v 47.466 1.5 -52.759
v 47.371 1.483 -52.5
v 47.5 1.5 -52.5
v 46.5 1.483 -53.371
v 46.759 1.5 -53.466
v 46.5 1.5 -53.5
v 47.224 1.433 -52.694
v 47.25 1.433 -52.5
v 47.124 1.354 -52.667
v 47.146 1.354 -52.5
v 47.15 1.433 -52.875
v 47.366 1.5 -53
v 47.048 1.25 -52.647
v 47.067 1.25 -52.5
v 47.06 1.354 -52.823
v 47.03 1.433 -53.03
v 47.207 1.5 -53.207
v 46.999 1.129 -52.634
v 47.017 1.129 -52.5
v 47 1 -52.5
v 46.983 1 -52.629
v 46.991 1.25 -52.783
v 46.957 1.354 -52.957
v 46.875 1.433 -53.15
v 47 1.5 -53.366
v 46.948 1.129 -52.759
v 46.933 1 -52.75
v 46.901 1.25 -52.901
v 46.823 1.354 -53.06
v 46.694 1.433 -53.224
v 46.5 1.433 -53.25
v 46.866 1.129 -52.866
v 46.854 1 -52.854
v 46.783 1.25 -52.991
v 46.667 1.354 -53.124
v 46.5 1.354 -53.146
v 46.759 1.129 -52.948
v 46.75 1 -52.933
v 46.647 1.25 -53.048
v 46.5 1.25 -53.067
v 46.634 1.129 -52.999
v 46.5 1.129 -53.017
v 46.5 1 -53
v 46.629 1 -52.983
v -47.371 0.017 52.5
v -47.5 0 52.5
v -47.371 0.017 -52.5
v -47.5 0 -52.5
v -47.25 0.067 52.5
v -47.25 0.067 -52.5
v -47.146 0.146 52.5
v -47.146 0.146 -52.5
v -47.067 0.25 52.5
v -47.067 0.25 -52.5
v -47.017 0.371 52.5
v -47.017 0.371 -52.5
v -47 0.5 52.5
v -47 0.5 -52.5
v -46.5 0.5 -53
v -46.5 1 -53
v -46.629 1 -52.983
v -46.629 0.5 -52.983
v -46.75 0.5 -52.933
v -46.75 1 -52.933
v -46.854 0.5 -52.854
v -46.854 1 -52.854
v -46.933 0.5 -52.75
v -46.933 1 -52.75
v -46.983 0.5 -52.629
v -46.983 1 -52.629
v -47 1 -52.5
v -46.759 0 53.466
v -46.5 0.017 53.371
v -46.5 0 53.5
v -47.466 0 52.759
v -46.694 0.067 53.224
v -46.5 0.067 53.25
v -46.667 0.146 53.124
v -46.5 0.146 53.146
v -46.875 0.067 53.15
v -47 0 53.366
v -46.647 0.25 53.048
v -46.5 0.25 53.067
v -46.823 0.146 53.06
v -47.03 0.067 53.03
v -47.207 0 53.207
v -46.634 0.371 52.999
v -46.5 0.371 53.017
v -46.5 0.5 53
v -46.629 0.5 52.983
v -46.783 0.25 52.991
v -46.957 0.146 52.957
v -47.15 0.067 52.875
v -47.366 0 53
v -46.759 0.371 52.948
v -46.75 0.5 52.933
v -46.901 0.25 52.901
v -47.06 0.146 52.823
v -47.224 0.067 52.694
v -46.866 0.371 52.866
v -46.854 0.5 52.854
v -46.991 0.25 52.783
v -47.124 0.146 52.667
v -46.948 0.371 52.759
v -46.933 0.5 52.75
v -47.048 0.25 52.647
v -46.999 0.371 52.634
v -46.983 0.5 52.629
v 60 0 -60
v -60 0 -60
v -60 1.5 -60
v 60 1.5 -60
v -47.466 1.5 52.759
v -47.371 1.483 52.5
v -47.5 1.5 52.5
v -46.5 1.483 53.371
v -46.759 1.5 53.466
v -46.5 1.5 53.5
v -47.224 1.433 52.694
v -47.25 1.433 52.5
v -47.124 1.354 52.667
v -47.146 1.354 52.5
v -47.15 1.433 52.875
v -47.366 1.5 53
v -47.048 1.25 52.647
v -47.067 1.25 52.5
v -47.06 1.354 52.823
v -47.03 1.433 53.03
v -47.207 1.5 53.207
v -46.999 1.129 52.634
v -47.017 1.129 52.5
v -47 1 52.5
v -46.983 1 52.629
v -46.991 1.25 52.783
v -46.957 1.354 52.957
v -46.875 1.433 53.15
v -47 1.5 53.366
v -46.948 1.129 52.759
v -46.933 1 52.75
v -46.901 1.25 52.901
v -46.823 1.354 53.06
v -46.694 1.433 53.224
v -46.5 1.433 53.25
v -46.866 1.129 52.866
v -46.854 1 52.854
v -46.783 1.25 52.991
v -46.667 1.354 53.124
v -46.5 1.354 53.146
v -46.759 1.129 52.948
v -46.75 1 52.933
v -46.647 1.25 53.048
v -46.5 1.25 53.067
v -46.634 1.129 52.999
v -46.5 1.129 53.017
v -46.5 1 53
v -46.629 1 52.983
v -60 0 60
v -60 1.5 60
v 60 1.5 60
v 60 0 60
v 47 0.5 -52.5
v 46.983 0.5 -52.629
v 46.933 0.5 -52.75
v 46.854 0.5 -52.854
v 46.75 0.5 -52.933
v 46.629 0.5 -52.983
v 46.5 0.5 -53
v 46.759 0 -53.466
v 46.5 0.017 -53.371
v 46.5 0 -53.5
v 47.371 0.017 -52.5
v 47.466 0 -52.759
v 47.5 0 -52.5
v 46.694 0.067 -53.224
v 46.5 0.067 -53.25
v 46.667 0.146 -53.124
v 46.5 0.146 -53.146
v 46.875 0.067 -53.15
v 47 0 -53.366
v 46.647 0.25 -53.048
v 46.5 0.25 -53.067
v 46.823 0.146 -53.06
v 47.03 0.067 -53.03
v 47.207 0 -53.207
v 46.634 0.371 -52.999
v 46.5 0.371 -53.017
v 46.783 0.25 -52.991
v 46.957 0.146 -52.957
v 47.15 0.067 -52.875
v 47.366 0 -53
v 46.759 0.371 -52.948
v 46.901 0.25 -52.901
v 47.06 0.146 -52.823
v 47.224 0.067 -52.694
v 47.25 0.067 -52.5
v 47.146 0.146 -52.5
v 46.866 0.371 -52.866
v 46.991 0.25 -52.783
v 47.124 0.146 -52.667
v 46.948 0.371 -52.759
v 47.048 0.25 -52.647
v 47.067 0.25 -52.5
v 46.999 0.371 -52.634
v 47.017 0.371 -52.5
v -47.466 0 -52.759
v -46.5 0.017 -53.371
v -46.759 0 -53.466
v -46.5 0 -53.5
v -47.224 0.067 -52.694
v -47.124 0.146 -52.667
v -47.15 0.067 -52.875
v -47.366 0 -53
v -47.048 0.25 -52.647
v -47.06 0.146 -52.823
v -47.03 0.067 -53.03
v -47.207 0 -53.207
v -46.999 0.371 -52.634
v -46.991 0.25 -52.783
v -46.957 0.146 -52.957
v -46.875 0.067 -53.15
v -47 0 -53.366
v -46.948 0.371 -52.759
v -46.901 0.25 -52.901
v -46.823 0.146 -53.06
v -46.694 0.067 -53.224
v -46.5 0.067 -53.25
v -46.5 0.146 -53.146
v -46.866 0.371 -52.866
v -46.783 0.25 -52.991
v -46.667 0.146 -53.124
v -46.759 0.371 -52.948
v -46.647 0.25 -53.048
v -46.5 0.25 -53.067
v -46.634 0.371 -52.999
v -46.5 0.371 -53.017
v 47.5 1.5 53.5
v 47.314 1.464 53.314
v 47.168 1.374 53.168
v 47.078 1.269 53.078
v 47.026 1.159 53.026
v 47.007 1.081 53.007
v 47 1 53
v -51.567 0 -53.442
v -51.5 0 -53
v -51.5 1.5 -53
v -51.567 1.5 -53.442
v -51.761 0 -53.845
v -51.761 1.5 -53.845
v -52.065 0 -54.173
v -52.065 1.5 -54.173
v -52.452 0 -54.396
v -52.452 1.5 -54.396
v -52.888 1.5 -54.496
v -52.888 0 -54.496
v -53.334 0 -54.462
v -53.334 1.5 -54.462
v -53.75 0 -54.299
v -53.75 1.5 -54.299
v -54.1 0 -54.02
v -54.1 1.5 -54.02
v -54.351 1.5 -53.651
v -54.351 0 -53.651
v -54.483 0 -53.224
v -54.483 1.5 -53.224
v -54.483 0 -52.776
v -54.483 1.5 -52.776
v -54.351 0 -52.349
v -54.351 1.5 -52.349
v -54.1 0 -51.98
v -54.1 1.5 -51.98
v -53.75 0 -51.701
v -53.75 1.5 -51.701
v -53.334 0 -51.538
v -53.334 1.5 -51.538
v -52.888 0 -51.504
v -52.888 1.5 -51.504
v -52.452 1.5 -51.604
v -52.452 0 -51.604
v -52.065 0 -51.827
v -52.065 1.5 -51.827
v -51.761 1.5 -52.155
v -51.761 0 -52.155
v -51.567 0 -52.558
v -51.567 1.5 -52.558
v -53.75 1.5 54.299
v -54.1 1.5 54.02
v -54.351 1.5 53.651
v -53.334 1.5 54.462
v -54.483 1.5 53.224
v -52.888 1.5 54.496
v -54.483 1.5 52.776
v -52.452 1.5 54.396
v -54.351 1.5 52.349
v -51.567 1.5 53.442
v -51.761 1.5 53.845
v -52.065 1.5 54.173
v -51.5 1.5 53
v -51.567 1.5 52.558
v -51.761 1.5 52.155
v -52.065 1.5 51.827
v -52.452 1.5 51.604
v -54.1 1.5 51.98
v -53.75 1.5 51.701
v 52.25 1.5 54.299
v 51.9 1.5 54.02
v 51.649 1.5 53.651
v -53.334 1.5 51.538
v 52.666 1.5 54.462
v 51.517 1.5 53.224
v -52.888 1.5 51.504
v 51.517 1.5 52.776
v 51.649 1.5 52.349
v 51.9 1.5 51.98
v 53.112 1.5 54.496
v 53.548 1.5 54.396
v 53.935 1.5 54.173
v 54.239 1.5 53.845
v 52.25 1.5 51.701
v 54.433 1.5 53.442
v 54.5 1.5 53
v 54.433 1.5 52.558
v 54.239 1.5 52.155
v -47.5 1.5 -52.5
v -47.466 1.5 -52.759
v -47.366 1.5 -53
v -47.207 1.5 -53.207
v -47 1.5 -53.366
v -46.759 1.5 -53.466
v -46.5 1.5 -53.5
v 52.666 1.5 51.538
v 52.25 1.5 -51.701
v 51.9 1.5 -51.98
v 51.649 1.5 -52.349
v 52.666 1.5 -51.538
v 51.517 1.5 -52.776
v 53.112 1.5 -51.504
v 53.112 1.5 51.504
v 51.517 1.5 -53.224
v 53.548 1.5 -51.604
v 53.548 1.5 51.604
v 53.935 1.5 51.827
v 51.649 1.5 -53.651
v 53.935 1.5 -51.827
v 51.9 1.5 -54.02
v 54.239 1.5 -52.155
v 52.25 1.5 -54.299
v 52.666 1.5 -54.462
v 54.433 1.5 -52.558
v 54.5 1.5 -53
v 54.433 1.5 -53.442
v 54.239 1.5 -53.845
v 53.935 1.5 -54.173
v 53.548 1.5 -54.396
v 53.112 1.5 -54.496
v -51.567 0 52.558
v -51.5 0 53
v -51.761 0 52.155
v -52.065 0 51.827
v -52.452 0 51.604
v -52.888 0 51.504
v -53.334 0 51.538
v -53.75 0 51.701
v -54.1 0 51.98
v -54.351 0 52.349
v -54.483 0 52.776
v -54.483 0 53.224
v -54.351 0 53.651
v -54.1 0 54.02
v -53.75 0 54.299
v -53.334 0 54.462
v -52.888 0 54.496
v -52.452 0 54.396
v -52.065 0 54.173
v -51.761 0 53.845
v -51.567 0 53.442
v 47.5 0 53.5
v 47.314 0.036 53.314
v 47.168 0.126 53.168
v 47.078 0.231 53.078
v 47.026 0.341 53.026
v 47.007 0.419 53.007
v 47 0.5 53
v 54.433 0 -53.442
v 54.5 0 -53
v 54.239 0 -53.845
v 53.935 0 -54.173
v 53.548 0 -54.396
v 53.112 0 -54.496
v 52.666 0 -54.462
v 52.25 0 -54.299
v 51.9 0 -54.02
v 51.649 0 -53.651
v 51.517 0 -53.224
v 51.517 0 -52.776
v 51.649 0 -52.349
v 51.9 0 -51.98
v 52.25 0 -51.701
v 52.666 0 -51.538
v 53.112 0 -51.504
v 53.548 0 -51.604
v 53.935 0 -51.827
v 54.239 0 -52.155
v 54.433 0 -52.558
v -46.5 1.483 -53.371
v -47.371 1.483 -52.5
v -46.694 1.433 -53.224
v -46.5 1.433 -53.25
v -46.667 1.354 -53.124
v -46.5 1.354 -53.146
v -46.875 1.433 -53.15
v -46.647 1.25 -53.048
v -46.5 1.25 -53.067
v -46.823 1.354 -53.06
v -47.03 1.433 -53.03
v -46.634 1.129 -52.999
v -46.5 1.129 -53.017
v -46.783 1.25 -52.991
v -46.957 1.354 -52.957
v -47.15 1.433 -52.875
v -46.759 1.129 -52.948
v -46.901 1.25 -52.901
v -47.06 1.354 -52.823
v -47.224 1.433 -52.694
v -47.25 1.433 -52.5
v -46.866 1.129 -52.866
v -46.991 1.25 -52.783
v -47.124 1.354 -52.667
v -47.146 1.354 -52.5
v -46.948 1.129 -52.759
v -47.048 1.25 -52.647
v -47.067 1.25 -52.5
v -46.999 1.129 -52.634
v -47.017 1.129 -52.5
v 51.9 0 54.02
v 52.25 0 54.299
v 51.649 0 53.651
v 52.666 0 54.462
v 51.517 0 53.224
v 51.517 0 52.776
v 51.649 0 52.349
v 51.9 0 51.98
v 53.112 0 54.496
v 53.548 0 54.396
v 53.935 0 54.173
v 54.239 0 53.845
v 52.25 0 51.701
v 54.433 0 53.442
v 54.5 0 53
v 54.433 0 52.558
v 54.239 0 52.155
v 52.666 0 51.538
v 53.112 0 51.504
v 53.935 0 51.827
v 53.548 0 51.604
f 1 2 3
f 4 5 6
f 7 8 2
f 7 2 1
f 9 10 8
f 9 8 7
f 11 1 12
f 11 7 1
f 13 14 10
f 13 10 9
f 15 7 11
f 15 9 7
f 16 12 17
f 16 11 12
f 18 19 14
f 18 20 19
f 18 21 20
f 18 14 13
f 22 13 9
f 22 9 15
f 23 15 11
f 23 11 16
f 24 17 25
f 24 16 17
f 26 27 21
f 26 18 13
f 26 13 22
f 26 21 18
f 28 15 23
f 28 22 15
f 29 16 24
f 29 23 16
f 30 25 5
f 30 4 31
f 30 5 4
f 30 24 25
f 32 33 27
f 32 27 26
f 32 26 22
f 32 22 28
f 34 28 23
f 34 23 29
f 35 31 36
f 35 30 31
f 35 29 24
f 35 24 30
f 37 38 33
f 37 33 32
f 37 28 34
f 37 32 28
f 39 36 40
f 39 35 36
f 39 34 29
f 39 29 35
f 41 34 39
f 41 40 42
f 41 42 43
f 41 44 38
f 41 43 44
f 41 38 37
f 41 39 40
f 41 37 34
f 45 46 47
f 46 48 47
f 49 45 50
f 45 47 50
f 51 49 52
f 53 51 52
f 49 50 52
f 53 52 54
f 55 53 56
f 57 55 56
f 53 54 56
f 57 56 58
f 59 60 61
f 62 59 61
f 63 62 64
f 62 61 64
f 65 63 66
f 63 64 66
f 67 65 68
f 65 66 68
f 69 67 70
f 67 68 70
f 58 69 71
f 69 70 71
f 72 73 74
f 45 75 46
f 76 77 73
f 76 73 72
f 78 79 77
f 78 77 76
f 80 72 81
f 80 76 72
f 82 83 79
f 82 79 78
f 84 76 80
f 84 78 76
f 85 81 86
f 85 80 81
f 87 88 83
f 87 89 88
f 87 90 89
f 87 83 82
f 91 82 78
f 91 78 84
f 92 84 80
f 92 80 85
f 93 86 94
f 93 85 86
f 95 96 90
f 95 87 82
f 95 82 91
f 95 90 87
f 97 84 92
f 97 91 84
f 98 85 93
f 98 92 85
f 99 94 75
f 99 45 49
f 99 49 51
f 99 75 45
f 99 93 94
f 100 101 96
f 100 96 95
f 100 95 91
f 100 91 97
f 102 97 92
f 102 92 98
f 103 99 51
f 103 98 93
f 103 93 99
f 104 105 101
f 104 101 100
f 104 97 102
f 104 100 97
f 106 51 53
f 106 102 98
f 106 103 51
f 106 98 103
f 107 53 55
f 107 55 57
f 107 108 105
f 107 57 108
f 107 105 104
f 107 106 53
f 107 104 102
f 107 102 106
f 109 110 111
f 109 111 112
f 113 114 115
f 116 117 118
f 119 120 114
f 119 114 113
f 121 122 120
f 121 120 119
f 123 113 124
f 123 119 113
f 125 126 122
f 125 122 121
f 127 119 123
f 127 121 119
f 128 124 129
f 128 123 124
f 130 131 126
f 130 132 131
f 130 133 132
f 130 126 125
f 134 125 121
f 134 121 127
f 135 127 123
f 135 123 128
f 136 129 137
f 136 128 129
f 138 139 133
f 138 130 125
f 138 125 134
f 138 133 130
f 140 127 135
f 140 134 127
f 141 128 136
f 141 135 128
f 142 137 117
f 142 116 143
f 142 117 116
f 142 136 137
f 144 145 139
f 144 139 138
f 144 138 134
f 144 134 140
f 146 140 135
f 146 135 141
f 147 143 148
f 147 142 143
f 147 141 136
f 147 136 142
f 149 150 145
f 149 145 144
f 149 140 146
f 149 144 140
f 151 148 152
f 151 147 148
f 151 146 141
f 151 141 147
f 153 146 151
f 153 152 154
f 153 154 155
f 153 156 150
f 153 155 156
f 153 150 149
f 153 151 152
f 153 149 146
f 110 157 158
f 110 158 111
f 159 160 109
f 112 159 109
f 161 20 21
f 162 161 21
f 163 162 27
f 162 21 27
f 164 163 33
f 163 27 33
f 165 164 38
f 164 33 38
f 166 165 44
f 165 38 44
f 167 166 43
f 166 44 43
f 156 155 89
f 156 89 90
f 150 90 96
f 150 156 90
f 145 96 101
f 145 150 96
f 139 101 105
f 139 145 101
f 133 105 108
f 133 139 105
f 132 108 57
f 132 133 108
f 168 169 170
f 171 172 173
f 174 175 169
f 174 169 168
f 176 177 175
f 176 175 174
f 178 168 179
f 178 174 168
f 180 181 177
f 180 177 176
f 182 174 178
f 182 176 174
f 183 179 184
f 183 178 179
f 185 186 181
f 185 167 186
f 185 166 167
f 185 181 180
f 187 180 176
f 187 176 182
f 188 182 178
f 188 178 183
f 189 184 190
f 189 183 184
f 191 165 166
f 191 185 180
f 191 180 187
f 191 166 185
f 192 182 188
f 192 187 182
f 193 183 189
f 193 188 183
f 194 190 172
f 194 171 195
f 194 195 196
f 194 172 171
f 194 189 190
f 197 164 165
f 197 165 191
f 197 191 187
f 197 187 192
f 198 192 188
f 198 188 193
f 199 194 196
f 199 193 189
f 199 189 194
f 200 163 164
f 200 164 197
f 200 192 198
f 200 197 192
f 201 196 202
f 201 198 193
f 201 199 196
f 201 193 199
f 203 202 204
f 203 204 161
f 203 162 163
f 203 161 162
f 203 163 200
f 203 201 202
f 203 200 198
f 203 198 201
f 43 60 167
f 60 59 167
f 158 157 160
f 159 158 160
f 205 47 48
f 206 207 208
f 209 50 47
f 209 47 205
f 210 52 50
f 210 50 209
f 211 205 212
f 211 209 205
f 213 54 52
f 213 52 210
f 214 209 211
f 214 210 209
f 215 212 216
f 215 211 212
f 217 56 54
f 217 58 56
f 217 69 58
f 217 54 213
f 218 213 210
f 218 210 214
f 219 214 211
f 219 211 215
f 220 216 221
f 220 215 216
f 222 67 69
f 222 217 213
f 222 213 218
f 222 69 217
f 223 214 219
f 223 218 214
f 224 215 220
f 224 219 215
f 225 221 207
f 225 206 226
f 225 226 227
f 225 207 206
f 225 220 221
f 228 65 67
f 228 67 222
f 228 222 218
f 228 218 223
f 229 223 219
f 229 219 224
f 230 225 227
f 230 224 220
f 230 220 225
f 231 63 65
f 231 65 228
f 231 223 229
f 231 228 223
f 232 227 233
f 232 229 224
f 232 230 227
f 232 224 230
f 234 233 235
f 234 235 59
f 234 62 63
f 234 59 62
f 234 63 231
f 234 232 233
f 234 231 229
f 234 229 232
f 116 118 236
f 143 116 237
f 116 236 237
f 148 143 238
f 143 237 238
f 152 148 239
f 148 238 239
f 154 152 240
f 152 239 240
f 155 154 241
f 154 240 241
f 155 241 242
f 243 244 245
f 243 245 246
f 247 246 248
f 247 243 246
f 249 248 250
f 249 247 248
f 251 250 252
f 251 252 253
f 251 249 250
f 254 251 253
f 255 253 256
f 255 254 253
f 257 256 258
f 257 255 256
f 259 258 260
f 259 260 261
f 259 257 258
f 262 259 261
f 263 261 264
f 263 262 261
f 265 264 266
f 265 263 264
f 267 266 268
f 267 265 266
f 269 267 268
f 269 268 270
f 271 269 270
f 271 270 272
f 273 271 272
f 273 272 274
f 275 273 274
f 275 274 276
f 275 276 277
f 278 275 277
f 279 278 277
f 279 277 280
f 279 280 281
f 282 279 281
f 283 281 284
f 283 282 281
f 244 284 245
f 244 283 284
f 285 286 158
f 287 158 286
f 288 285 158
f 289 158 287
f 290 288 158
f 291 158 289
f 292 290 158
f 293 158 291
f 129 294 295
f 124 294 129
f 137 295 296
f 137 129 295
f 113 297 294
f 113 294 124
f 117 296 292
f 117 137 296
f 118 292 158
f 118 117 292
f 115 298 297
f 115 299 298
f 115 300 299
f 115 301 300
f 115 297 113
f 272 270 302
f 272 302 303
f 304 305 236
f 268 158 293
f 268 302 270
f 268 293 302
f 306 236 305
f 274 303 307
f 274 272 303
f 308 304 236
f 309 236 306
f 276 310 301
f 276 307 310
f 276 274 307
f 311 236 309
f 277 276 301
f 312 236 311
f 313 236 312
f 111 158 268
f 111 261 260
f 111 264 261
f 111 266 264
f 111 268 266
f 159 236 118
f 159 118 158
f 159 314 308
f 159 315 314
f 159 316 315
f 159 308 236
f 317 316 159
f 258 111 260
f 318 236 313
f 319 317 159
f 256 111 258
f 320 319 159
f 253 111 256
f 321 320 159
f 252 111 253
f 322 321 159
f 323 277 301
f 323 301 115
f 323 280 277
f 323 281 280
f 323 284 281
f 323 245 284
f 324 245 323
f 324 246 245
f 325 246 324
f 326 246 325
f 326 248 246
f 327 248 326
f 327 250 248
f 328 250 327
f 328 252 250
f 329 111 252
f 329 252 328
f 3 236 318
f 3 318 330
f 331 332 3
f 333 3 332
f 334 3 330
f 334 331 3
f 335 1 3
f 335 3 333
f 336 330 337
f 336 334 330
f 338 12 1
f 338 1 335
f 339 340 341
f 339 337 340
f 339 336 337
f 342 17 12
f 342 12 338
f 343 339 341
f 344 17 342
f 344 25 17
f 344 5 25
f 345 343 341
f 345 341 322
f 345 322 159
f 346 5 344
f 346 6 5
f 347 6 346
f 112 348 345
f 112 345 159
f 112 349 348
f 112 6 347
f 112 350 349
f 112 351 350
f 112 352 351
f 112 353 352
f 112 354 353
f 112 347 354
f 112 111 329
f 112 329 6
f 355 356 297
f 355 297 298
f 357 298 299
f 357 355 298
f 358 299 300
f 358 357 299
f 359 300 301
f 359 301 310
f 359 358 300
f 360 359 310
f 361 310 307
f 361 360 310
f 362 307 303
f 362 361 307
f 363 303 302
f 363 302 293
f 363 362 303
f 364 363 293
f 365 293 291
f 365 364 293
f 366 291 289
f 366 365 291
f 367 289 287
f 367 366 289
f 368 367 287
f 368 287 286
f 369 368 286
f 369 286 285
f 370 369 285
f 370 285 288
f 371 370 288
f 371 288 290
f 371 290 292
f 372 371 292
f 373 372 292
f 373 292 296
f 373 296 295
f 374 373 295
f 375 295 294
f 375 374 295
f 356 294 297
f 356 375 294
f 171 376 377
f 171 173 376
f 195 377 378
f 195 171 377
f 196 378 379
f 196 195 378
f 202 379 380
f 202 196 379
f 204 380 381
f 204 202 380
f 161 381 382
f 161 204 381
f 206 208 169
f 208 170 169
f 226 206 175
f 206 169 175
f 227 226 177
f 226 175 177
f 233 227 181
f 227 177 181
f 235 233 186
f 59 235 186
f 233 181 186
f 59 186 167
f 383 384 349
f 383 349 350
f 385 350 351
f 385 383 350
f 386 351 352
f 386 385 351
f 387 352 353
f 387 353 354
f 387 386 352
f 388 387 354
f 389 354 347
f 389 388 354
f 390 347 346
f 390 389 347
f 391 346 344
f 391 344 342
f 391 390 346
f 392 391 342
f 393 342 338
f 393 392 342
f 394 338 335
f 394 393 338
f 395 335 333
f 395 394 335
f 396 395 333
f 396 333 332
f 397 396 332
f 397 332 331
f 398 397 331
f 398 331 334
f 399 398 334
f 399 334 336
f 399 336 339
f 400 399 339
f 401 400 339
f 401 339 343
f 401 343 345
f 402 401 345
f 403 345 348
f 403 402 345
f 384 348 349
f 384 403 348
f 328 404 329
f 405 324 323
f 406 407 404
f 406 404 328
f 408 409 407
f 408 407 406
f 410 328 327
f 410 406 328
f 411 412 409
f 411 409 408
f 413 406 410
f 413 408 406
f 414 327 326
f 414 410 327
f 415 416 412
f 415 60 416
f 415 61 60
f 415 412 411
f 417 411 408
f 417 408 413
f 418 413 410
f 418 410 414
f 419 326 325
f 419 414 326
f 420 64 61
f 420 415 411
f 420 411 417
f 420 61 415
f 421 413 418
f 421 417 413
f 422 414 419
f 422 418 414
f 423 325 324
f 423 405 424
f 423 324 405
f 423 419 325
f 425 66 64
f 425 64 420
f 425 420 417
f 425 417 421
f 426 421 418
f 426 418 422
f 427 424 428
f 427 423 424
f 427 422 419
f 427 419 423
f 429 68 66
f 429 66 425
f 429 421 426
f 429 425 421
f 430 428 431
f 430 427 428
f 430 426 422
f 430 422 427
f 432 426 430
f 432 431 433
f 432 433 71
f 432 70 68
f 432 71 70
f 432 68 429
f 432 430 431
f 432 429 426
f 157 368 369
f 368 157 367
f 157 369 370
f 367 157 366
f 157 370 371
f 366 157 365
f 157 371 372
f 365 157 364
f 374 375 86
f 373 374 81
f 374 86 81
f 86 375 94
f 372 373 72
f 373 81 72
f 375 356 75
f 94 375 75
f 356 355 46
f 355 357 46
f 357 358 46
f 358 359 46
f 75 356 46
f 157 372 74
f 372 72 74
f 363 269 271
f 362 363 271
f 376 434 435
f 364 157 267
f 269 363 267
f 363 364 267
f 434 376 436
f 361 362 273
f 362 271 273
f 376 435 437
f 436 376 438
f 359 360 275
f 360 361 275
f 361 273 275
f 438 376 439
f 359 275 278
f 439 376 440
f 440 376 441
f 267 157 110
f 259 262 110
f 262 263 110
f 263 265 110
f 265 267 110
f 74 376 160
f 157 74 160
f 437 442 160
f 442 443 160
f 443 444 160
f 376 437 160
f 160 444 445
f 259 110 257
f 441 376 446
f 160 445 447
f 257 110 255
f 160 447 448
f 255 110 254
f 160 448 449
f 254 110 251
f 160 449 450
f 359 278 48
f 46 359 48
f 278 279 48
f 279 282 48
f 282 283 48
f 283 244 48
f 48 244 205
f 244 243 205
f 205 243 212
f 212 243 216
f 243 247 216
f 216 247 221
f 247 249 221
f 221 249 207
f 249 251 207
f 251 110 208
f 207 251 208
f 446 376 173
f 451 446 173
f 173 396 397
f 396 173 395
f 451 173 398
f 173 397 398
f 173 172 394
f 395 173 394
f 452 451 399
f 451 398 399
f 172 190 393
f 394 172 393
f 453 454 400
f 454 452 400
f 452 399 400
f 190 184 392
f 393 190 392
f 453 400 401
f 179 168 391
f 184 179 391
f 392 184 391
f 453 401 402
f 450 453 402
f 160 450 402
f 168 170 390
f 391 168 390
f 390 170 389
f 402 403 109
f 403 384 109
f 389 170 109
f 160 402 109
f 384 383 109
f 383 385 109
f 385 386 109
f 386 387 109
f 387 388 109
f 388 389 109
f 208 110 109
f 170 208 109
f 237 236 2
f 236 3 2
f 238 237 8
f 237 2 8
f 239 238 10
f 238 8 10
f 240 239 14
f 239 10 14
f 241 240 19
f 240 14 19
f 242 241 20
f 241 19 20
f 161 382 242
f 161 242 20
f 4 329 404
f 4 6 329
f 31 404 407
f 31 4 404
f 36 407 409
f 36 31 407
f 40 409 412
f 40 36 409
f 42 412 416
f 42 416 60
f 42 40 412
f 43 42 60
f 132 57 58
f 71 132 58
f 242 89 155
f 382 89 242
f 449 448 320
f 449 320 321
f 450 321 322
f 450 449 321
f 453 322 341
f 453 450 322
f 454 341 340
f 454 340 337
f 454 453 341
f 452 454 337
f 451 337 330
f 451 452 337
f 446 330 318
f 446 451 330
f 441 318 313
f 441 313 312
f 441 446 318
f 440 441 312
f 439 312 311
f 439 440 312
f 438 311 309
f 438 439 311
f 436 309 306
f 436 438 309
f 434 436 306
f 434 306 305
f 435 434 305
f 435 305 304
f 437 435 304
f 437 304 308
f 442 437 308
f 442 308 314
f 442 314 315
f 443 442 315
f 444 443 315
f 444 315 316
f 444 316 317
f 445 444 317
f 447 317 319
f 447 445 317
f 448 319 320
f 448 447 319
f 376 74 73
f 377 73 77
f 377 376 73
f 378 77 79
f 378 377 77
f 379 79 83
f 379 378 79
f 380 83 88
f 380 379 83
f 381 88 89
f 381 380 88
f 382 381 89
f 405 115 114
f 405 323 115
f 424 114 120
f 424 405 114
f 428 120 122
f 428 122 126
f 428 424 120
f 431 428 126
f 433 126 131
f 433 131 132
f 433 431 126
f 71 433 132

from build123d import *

# Parameters (mm, degrees)
SKETCH1_W           = 120
SKETCH1_H           = 120
BOSS_EXTRUDE1_DEPTH = 1.5
SKETCH4_R           = 2.5
CUT_EXTRUDE2_DEPTH  = 1.5
SKETCH7_R           = 1.5
CUT_EXTRUDE3_DEPTH  = 1.5
SKETCH8_W           = 94
SKETCH8_H           = 106
CUT_EXTRUDE4_DEPTH  = 1.5
FILLET1_R           = 0.5


with BuildPart() as part:
    # Sketch1 → Boss-Extrude1 (new body)
    with BuildSketch(Plane(origin=(0, 0, 0), x_dir=(1, 0, 0), z_dir=(0, 1, 0))):
        Rectangle(SKETCH1_W, SKETCH1_H)
    extrude(amount=BOSS_EXTRUDE1_DEPTH)

    # Sketch4 → Cut-Extrude2 (cut)
    with BuildSketch(Plane(origin=(0, 0, 0), x_dir=(1, 0, 0), z_dir=(0, 1, 0))):
        with Locations((-22.5, 0)):
            Circle(SKETCH4_R)
        with Locations((22.5, 0)):
            Circle(SKETCH4_R)
    extrude(amount=CUT_EXTRUDE2_DEPTH, mode=Mode.SUBTRACT)

    # Sketch7 → Cut-Extrude3 (cut)
    with BuildSketch(Plane(origin=(0, 0, 0), x_dir=(1, 0, 0), z_dir=(0, 1, 0))):
        with Locations((-53, 53)):
            Circle(SKETCH7_R)
        with Locations((53, 53)):
            Circle(SKETCH7_R)
        with Locations((-53, -53)):
            Circle(SKETCH7_R)
        with Locations((53, -53)):
            Circle(SKETCH7_R)
    extrude(amount=CUT_EXTRUDE3_DEPTH, mode=Mode.SUBTRACT)

    # Sketch8 → Cut-Extrude4 (cut)
    with BuildSketch(Plane(origin=(0, 0, 0), x_dir=(1, 0, 0), z_dir=(0, 1, 0))):
        Rectangle(SKETCH8_W, SKETCH8_H)
    extrude(amount=CUT_EXTRUDE4_DEPTH, mode=Mode.SUBTRACT)

    # Fillet1
    fillet1_edges = [part.edges().sort_by_distance(p)[0] for p in [
        (0, 1.5, -53),
        (47, 0.75, -53),
        (0, 0, -53),
        (47, 1.5, 0),
        (47, 0, 0),
        (0, 1.5, 53),
        (-47, 0.75, 53),
        (0, 0, 53),
        (-47, 1.5, 0),
        (-47, 0.75, -53),
        (-47, 0, 0),
    ]]
    fillet(fillet1_edges, radius=FILLET1_R)


solid = part.part
